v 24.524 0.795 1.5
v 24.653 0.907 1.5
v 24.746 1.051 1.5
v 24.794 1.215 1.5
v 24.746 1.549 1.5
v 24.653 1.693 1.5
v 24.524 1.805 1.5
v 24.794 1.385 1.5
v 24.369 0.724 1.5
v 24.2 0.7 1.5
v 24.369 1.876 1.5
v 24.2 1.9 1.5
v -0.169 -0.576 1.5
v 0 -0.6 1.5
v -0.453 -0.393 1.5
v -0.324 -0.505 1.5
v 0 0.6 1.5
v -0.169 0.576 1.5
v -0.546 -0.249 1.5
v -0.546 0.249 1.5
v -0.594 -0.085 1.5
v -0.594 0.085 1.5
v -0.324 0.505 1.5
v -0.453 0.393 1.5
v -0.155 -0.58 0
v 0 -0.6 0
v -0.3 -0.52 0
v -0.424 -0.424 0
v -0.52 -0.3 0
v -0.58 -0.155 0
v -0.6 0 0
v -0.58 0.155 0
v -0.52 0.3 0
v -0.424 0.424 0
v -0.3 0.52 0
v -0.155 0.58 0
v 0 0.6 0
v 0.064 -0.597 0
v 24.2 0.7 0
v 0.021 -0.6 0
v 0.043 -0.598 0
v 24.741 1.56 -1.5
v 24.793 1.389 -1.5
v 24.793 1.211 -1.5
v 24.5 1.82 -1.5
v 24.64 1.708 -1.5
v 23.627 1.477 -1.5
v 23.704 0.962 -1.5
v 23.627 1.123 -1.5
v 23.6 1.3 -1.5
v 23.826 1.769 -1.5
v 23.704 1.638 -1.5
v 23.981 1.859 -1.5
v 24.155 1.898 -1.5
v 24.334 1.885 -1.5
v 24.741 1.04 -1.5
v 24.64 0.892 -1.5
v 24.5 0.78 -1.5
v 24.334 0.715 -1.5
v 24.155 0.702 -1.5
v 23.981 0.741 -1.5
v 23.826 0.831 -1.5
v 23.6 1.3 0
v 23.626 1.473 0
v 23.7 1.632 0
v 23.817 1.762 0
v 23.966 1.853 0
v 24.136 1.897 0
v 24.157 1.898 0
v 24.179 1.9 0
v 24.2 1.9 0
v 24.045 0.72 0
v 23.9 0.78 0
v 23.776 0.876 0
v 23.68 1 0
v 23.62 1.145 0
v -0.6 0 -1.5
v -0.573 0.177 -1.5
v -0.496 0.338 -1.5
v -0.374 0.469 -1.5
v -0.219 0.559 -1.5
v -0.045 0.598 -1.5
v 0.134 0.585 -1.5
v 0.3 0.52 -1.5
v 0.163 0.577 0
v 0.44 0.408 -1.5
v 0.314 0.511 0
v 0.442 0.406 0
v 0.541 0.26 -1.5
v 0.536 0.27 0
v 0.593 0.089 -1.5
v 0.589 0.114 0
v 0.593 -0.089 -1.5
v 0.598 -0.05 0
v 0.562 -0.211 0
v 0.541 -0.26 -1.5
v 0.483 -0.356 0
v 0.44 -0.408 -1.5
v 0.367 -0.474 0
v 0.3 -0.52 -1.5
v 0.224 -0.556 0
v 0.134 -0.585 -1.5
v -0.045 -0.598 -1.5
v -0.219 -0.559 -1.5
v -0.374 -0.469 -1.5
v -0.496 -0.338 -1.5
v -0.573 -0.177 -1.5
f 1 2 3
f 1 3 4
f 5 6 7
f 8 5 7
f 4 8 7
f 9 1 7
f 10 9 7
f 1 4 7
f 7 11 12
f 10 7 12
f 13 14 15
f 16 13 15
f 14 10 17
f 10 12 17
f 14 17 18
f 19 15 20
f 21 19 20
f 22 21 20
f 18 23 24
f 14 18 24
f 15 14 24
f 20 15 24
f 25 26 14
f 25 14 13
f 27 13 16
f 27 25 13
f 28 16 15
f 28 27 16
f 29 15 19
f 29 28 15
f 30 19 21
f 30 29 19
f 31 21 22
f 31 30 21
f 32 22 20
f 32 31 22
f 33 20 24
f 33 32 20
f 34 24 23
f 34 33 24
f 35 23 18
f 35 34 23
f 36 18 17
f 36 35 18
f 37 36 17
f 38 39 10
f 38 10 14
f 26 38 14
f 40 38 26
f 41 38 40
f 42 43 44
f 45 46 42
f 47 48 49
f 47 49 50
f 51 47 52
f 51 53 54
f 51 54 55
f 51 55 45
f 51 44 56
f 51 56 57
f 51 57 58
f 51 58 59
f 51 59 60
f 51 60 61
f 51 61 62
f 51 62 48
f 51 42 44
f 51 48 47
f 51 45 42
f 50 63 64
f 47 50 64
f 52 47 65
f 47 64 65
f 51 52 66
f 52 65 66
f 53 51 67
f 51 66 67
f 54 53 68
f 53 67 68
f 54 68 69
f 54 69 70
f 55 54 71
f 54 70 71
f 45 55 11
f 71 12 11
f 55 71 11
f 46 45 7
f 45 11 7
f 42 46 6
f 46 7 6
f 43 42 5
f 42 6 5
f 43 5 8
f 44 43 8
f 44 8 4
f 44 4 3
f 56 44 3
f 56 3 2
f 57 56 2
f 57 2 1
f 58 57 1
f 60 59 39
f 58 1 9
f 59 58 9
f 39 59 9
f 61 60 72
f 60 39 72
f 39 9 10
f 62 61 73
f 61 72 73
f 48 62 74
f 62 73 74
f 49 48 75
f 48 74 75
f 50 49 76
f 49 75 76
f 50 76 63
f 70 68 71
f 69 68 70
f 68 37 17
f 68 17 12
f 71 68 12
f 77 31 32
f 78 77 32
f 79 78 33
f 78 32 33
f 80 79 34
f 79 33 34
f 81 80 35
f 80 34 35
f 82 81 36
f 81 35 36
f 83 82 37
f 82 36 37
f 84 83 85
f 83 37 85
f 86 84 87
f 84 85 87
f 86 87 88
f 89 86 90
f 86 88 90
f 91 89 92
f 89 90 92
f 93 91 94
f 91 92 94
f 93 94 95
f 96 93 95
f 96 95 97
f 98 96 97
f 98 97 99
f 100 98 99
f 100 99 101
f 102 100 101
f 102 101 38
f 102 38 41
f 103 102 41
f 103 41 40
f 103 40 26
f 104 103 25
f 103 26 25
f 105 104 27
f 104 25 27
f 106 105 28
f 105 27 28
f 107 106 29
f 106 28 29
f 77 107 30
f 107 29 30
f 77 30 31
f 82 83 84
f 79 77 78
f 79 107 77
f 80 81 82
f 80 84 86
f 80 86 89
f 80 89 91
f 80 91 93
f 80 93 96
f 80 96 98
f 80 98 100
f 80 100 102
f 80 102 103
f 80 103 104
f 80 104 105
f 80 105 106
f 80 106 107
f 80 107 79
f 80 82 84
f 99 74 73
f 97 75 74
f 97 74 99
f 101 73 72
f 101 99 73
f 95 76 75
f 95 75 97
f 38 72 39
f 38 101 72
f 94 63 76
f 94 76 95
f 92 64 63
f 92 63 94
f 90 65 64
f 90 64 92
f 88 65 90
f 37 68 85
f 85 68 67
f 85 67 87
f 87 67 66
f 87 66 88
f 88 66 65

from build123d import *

# Parameters (mm, degrees)
SALIENTE_EXTRUIR1_DEPTH = 1.5
CROQUIS2_R              = 0.6
SALIENTE_EXTRUIR2_DEPTH = 1.5


with BuildPart() as part:
    # Croquis1 → Saliente-Extruir1 (new body)
    with BuildSketch(Plane.XY):
        with BuildLine():
            Line((0, 0.6), (24.2, 1.9))
            ThreePointArc((24.2, 1.9), (24.8, 1.3), (24.2, 0.7))
            Line((24.2, 0.7), (0, -0.6))
            ThreePointArc((0, -0.6), (-0.6, 0), (0, 0.6))
        make_face()
    extrude(amount=SALIENTE_EXTRUIR1_DEPTH)

    # Croquis2 → Saliente-Extruir2 (add)
    with BuildSketch(Plane(origin=(0, 0, 0), x_dir=(-1, 0, 0), z_dir=(0, 0, -1))):
        with Locations((-24.2, 1.3)):
            Circle(CROQUIS2_R)
        Circle(CROQUIS2_R)
    extrude(amount=SALIENTE_EXTRUIR2_DEPTH)


solid = part.part
